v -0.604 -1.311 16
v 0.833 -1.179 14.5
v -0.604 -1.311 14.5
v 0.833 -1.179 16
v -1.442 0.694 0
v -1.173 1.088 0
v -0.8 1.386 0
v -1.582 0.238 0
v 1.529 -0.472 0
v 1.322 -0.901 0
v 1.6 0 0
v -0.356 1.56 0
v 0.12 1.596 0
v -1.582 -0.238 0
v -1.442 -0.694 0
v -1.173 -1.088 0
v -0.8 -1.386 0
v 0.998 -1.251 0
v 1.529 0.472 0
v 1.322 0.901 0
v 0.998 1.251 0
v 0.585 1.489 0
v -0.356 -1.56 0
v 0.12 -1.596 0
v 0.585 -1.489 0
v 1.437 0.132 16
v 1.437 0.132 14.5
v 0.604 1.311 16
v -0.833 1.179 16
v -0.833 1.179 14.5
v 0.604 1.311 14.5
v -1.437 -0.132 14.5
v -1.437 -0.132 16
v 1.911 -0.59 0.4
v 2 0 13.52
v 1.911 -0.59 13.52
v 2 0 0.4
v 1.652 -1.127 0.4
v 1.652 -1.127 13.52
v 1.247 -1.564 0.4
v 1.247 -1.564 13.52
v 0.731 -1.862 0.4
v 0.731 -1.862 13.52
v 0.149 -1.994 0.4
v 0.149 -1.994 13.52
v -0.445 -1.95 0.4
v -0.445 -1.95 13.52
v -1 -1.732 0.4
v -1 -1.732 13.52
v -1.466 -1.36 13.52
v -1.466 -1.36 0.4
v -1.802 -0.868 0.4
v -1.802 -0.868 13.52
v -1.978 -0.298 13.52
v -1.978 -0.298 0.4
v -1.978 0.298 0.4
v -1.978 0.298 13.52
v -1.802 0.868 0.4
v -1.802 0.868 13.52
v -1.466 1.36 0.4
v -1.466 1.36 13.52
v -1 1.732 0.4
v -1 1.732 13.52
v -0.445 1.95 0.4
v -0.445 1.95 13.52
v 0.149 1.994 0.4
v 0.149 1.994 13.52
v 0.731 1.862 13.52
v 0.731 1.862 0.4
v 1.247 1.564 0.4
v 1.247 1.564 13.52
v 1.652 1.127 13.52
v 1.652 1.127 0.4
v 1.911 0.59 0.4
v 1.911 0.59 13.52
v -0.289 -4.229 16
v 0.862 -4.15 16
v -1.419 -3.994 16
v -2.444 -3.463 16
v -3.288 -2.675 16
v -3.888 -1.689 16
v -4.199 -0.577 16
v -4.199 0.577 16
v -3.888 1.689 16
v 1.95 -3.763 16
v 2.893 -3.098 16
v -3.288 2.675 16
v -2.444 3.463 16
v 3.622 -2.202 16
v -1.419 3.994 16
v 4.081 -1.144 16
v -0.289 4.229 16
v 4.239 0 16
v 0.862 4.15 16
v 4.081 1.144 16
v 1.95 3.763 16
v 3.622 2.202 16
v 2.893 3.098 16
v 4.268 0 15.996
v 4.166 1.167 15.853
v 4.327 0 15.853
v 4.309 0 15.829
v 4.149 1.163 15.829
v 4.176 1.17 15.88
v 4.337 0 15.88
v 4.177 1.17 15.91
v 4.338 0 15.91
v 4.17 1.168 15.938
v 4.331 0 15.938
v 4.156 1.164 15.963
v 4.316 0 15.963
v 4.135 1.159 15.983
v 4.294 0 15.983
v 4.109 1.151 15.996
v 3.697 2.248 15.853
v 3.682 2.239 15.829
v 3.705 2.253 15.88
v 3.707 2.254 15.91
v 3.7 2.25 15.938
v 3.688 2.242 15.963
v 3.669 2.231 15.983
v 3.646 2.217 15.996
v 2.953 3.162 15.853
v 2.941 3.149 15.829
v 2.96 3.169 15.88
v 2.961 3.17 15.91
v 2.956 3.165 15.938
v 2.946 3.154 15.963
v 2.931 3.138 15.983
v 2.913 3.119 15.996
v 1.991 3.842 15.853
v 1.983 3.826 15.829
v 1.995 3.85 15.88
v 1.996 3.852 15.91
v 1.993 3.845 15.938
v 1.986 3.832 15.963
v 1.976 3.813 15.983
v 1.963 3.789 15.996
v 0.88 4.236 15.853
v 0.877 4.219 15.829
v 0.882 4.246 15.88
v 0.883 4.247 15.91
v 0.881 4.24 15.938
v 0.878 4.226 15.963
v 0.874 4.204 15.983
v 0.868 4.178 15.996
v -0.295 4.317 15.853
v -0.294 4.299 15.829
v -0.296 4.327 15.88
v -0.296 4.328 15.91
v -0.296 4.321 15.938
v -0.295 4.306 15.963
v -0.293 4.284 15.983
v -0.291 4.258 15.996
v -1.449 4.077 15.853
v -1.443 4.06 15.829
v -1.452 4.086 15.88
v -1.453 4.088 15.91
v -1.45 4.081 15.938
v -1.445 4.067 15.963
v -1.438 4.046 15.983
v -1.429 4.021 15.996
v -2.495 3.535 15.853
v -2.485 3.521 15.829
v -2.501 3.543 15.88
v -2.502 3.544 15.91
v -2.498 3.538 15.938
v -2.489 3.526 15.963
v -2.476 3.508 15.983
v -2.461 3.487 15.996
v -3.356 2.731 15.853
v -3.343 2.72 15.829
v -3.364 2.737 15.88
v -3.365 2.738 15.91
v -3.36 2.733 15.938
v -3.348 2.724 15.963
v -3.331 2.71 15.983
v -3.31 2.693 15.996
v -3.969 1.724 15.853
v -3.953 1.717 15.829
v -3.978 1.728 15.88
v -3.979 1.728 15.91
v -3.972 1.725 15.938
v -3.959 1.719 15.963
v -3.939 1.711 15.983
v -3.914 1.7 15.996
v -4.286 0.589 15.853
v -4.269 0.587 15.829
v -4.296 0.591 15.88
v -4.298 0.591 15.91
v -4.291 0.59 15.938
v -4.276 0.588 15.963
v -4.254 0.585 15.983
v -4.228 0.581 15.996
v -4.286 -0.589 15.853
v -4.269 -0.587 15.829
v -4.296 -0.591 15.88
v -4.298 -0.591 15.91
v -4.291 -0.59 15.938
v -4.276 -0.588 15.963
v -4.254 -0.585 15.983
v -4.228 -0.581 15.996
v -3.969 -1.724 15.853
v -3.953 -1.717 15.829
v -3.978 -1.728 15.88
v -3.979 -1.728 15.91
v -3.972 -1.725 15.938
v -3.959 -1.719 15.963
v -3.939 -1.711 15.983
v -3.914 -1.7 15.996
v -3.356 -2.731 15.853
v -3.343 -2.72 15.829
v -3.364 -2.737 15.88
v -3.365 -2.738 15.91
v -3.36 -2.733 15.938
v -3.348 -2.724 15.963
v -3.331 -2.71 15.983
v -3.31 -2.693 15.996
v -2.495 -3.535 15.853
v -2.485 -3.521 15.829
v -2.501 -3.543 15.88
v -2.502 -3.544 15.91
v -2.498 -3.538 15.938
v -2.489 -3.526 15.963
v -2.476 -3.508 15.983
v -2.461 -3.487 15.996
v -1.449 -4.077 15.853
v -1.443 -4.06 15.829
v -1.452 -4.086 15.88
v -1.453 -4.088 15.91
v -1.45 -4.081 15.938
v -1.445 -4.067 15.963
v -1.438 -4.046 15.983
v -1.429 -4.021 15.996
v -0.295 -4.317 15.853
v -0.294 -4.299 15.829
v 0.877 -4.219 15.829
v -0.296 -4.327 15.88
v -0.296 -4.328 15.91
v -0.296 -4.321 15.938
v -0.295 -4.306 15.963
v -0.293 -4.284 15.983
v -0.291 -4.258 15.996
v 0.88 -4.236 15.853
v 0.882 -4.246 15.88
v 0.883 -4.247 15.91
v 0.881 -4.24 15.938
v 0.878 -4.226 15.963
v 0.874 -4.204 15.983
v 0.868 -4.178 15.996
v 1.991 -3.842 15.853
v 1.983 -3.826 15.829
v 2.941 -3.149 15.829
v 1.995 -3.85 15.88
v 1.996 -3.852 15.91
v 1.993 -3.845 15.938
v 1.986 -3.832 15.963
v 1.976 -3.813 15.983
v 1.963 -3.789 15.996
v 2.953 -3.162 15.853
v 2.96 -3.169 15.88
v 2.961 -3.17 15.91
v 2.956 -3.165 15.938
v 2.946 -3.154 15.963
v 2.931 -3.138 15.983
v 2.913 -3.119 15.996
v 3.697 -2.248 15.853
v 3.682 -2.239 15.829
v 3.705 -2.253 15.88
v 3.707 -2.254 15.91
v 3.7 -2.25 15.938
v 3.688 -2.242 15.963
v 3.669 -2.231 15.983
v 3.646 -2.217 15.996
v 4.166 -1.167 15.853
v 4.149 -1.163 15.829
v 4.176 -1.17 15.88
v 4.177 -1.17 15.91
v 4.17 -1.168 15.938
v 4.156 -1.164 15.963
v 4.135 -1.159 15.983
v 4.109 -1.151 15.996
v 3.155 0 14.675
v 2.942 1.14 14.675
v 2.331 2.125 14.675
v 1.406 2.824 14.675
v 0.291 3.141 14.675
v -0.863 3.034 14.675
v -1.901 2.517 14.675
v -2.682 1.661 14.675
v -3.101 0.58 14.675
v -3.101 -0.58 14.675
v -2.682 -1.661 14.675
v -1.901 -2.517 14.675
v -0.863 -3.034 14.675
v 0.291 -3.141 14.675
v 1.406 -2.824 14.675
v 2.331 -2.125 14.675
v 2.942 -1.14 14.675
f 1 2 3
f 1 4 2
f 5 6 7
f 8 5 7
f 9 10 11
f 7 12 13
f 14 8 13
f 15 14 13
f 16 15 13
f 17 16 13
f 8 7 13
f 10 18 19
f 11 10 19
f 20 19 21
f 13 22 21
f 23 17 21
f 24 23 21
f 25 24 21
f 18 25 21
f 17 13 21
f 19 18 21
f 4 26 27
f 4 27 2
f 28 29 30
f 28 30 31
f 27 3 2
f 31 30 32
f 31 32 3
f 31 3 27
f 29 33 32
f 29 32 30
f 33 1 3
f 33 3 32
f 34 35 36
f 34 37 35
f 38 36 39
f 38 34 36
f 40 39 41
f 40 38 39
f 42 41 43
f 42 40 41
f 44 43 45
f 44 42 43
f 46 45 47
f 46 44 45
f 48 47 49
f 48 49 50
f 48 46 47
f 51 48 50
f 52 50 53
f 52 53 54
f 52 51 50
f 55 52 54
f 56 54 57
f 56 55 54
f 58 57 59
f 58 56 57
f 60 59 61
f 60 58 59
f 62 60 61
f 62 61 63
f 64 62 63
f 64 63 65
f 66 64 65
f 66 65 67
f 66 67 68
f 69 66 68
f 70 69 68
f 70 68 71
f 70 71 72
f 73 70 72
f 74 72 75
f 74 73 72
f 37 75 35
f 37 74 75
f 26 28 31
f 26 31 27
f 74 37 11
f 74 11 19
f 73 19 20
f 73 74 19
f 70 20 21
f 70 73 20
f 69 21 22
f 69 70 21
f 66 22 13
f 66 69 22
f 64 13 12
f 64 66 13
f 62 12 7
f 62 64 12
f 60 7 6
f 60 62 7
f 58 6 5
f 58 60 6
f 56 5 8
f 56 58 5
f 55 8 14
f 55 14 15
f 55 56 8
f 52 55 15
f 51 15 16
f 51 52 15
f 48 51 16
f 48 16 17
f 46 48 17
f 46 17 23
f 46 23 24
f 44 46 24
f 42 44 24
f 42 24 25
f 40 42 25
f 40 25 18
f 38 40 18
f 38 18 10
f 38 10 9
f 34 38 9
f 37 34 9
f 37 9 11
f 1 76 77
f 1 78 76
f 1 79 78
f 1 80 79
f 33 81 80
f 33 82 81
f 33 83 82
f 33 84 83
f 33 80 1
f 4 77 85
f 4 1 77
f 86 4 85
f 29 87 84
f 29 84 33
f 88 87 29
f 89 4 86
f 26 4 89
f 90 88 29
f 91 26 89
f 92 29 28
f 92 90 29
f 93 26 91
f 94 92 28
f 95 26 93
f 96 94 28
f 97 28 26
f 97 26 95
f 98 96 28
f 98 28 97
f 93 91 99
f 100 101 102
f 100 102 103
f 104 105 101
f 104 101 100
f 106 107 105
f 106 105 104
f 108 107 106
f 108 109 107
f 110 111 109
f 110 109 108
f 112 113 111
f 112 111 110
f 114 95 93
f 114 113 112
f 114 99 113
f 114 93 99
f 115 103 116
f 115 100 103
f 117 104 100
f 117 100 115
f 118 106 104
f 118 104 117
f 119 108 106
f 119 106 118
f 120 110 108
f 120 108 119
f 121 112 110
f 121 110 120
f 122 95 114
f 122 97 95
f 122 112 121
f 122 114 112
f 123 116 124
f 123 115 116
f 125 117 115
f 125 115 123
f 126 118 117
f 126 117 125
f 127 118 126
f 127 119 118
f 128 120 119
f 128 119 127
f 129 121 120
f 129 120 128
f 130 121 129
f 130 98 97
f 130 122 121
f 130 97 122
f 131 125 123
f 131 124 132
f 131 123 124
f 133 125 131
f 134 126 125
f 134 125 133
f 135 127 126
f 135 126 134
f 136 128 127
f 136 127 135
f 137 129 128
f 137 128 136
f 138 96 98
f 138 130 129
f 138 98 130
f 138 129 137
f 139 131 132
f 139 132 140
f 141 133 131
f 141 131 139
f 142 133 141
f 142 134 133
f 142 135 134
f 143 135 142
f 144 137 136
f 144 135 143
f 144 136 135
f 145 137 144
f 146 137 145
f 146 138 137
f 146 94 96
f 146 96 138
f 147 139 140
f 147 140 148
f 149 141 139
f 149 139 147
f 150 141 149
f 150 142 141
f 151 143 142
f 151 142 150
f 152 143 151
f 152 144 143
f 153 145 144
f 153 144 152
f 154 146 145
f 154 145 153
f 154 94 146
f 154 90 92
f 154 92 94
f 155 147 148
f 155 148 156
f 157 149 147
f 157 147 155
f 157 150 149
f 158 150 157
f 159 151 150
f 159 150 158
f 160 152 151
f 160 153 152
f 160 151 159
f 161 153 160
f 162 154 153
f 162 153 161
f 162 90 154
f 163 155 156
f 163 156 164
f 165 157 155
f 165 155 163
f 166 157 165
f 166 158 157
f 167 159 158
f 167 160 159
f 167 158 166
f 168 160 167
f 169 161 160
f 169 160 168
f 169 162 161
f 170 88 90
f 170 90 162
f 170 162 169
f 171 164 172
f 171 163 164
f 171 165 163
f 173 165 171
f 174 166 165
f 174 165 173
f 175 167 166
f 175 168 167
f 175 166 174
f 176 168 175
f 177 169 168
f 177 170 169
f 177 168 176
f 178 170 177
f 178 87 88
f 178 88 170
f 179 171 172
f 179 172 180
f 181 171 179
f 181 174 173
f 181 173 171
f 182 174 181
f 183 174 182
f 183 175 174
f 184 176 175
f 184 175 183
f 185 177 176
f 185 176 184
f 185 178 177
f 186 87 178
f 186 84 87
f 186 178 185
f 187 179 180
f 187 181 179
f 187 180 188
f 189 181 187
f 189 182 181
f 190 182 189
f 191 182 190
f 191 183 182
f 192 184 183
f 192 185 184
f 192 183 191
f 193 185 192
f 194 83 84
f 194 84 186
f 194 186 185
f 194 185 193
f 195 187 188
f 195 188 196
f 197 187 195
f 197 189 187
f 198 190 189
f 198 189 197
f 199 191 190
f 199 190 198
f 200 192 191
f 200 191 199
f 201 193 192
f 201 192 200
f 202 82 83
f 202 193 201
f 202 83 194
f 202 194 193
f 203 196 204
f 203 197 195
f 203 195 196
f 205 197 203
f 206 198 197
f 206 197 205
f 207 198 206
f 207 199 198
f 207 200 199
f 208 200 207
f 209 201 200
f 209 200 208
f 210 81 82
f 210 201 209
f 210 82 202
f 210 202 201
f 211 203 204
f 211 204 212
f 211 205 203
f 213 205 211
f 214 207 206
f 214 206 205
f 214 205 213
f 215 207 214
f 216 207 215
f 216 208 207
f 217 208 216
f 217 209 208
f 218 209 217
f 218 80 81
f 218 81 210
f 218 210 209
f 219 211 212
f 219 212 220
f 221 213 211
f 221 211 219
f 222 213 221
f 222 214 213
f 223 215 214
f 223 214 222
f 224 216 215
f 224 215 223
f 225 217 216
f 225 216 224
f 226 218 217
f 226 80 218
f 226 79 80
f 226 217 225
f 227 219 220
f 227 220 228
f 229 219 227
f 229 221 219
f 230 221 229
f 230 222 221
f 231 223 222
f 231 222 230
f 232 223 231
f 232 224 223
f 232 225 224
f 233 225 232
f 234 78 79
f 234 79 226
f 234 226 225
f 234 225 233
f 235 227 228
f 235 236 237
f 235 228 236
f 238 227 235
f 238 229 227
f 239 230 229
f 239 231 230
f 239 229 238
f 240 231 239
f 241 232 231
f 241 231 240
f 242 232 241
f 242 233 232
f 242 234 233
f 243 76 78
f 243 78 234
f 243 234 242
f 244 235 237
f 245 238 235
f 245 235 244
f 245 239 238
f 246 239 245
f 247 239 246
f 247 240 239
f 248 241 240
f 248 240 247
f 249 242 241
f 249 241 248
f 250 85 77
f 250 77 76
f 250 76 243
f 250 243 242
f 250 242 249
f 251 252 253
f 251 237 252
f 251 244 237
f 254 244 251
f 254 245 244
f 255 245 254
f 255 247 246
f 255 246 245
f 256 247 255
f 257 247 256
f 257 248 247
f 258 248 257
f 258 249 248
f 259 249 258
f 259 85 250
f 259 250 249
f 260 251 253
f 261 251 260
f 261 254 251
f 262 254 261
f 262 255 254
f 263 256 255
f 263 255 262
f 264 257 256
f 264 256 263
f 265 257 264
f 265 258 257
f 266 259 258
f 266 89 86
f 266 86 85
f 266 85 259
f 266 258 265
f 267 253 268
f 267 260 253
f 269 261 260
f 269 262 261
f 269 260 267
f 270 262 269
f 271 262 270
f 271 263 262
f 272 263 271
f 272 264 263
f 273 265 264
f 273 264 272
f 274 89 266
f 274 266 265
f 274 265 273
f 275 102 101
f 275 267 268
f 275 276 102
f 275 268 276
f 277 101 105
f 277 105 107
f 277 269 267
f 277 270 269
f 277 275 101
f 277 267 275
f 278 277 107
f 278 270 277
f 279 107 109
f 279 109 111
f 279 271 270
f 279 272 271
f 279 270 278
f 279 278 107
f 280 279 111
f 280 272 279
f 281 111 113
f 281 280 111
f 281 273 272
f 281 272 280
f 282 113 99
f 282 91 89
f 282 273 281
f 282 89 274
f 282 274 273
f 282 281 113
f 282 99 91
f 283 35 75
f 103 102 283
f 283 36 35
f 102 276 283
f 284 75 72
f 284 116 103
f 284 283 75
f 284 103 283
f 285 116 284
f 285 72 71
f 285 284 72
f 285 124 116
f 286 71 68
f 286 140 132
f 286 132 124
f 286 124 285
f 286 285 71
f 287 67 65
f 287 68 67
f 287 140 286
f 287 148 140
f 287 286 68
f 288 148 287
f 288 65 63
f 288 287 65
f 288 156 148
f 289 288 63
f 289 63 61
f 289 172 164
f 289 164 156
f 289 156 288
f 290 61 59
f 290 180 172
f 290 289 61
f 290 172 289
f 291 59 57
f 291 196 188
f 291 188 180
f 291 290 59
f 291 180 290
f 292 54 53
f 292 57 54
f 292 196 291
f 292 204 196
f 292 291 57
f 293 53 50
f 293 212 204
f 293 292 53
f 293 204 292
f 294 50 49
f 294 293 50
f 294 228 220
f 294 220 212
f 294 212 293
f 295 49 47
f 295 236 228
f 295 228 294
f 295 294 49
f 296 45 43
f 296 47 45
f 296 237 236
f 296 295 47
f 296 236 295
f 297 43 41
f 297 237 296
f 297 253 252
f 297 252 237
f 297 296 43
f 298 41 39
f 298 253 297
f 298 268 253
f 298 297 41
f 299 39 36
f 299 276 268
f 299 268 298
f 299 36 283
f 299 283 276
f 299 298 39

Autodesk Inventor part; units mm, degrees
ref_plane "YZ Plane" through (0, 0, 0) normal (1, 0, 0) x (0, 1, 0)
ref_plane "XZ Plane" through (0, 0, 0) normal (0, 1, 0) x (-1, 0, 0)
ref_plane "XY Plane" through (0, 0, 0) normal (0, 0, 1) x (1, 0, 0)
sketch "Sketch1" plane through (0, 0, 0) normal (0, 0, 1) x (1, 0, 0)
  circle A0 centre (0, 0) radius 2
  dimension "Diameter" = 4
extrude "Extrusion1" add sketch "Sketch1" along normal blind 13.52
sketch "Sketch2" plane through (0, 0, 13.52) normal (0, 0, 1) x (1, 0, 0)
  circle A0 centre (0, 0) radius 2 projected
extrude "Extrusion2" add sketch "Sketch2" along normal blind 2.48 draft 45
sketch "Sketch3" plane through (0, 0, 16) normal (0, 0, 1) x (1, 0, 0)
  circle A0 centre (0, 0) radius 4.48 projected
  circle A1 centre (0, 0) radius 1.4434 construction
  line L0 (0.6042, 1.3108) -> (1.4373, 0.1322)
  line L1 (1.4373, 0.1322) -> (0.8331, -1.1787)
  line L2 (0.8331, -1.1787) -> (-0.6042, -1.3108)
  line L3 (-0.6042, -1.3108) -> (-1.4373, -0.1322)
  line L4 (-1.4373, -0.1322) -> (-0.8331, 1.1787)
  line L5 (-0.8331, 1.1787) -> (0.6042, 1.3108)
  dimension "Hex_Width" = 2.5
extrude "Extrusion3" cut sketch "Sketch3" against normal blind 1.5 contours L0 L1 L2 L3 L4 L5
thread "Thread1" size "M4x0.7" class "4g6g" standard "ANSI Metric M Profile" full length
chamfer "Chamfer2" distance 0.4 angle 45 1 edges at (-2, 0, 0)
fillet "Fillet1" radius 0.1 1 edges at (-4.48, 0, 16)
equation "\"d10\" = Thread_Length"
equation "\"d13\" = Chamfer"
equation "\"Thread_Length\" = 7.52"
equation "\"Chamfer\" = 0.4"
properties part number "SCREW, FLAT HD, P, 12.9, M4X0.7X16MM"
